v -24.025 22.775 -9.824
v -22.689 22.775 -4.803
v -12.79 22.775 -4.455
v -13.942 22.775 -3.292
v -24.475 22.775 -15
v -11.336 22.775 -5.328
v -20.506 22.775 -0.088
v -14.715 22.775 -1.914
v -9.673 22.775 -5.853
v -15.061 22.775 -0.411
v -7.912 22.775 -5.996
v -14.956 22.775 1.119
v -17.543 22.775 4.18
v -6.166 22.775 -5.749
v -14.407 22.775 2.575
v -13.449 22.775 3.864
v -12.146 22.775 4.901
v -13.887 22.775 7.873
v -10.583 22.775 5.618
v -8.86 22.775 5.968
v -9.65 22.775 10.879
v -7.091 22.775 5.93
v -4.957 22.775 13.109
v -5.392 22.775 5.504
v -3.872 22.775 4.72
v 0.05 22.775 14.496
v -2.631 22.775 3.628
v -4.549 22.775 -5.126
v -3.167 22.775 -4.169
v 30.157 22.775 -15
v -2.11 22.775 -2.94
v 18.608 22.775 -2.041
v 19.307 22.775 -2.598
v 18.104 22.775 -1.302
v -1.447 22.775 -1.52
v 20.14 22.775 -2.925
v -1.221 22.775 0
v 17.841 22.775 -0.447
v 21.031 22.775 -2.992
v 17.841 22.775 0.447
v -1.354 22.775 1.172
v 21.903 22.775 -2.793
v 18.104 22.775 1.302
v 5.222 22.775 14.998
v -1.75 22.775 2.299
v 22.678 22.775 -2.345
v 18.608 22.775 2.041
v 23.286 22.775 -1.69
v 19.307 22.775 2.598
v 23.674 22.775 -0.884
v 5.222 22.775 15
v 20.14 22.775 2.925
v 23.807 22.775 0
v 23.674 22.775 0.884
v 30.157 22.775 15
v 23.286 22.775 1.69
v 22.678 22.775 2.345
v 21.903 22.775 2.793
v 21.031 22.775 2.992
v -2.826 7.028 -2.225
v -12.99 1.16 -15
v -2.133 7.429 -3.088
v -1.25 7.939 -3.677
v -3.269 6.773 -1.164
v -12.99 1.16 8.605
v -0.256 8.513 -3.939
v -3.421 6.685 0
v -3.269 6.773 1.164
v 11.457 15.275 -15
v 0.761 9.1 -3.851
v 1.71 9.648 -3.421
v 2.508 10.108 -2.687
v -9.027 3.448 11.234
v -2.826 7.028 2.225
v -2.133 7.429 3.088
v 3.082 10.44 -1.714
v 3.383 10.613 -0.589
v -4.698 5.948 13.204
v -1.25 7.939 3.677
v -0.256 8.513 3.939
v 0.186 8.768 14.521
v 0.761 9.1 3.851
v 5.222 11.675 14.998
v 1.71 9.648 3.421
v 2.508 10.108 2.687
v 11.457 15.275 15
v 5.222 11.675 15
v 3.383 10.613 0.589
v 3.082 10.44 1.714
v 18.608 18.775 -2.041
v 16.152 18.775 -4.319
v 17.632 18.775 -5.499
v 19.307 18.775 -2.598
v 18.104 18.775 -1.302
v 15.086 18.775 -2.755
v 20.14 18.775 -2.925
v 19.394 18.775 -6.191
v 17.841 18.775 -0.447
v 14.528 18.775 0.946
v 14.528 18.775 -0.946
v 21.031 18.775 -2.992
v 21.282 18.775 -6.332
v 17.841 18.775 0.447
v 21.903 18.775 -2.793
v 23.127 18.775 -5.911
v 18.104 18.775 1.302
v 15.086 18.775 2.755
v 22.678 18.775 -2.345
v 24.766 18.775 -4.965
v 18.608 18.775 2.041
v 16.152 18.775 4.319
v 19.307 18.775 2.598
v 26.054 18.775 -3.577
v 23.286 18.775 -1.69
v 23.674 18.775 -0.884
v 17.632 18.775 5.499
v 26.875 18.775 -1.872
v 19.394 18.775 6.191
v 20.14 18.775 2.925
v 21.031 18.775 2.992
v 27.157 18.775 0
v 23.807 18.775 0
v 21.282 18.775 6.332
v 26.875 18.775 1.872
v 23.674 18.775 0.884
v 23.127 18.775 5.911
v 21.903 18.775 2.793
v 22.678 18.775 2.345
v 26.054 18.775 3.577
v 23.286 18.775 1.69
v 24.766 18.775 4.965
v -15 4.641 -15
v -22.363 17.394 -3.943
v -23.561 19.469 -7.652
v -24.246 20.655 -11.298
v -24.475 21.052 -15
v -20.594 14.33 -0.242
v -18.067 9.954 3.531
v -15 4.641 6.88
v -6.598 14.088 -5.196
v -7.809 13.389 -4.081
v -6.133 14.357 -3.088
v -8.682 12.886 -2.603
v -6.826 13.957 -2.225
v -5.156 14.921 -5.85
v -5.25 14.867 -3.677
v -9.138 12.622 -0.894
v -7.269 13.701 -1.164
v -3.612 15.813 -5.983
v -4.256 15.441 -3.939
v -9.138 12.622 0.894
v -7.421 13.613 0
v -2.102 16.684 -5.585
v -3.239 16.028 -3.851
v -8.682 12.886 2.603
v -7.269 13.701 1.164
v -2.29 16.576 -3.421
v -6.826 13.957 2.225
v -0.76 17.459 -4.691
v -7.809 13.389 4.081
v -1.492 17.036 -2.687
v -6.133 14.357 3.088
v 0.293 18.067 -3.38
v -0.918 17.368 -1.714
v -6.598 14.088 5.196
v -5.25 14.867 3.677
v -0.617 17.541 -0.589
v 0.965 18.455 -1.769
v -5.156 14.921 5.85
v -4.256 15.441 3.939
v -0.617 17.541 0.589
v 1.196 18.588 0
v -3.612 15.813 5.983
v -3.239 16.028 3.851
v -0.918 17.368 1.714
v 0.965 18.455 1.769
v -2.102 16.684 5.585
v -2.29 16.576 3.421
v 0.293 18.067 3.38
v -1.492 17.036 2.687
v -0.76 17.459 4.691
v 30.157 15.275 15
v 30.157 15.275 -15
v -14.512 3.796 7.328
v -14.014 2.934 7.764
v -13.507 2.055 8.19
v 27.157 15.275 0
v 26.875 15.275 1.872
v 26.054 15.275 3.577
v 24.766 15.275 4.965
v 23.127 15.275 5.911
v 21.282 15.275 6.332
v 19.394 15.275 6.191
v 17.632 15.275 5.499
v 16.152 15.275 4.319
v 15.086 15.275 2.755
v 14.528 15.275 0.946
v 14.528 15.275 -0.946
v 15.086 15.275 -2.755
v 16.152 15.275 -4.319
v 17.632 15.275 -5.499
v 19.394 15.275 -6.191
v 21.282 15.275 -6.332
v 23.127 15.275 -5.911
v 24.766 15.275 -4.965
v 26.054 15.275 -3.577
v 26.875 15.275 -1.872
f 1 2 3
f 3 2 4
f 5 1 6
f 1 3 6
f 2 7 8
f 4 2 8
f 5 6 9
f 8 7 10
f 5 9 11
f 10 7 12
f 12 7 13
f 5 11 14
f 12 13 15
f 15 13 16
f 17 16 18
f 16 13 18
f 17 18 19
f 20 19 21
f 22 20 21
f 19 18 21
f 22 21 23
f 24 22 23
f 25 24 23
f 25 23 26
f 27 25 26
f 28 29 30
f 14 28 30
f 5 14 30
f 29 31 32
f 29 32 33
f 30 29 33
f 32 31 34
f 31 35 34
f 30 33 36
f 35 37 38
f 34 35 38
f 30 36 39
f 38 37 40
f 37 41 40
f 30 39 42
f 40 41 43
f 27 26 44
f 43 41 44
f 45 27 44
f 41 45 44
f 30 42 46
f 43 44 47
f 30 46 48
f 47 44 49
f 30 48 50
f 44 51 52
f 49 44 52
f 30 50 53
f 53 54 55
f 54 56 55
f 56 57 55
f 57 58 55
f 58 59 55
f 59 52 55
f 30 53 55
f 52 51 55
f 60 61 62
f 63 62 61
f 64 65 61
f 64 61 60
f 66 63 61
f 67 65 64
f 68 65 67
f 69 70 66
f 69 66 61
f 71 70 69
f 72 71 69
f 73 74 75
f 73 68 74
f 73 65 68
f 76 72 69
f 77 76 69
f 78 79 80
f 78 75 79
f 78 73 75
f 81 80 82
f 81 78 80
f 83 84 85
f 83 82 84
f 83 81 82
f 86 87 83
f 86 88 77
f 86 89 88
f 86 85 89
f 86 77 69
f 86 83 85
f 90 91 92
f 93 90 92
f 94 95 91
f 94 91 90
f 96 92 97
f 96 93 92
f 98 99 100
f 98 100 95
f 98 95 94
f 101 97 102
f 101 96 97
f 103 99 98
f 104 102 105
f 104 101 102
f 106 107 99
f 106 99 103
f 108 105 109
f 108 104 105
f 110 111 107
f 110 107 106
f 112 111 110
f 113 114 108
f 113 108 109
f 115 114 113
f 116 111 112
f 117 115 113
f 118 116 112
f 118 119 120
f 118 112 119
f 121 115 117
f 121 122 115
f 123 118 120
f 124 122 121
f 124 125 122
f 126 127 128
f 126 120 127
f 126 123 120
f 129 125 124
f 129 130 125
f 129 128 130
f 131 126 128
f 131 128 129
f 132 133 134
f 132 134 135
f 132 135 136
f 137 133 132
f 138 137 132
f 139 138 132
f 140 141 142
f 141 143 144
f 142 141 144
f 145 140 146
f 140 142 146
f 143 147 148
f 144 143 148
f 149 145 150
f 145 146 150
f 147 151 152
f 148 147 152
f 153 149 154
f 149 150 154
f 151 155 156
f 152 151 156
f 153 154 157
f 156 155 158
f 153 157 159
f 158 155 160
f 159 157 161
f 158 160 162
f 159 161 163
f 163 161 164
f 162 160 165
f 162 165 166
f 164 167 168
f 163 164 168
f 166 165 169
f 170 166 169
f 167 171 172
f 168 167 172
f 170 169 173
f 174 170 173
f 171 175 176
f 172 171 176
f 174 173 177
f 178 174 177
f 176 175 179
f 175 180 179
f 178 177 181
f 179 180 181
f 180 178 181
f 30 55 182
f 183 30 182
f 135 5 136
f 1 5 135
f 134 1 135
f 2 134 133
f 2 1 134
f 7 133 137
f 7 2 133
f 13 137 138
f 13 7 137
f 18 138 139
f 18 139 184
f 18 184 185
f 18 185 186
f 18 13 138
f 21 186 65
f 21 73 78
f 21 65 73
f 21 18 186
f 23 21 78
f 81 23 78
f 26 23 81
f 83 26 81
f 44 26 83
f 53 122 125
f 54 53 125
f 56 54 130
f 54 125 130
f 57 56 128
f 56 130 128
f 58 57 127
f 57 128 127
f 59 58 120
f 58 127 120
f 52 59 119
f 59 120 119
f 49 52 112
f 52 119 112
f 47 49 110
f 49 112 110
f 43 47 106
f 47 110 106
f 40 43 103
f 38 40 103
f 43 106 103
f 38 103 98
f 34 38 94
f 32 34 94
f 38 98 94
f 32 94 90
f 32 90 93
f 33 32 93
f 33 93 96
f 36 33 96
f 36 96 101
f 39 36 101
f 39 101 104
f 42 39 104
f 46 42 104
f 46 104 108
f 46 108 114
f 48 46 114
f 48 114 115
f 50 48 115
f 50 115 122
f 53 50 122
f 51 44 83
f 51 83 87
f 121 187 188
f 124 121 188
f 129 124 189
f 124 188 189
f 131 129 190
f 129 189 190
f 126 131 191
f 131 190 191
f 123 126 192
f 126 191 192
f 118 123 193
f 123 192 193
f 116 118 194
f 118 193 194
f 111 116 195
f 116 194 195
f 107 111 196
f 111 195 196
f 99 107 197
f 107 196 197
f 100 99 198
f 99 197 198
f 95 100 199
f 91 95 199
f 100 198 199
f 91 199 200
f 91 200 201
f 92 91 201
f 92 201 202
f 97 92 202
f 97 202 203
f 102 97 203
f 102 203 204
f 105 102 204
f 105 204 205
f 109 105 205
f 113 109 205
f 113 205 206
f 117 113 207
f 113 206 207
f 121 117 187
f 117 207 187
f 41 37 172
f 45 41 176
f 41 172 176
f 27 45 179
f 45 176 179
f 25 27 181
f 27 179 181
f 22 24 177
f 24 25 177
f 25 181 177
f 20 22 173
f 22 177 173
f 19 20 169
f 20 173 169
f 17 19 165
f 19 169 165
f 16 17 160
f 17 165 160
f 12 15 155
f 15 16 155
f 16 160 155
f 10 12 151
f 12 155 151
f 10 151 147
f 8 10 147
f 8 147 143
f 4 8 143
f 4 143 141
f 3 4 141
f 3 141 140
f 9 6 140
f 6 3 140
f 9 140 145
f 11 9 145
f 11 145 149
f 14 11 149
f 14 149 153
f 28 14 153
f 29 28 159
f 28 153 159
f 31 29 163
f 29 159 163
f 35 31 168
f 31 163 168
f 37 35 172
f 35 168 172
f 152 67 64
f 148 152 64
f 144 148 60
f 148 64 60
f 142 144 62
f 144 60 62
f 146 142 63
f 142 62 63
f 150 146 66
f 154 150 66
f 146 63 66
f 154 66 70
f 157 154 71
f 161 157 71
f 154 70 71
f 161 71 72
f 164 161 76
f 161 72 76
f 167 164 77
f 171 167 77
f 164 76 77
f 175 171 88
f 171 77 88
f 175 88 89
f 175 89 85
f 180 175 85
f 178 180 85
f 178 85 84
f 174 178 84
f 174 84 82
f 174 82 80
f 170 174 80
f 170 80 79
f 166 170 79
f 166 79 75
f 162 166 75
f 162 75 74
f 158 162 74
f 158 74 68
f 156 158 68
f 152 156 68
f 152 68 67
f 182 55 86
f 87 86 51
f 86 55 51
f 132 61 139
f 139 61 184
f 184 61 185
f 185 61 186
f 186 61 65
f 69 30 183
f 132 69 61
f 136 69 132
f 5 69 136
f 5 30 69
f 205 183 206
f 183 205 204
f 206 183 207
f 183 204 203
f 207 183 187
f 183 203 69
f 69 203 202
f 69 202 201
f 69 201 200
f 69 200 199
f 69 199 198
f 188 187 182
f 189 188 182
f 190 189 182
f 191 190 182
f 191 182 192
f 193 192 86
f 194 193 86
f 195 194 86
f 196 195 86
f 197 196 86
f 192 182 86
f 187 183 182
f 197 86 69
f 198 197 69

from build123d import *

# Parameters (mm, degrees)
ESBO_O1_W                = 30
ESBO_O1_H                = 30
RESSALTO_EXTRUS_O1_DEPTH = 22.775
CORTE_EXTRUS_O1_DEPTH    = 31
ESBO_O3_OUTSIDE_W        = 48.998
ESBO_O3_OUTSIDE_H        = 41.63
ESBO_O3_OUTSIDE_W_2      = 30
ESBO_O3_OUTSIDE_H_2      = 30
CORTE_EXTRUS_O2_DEPTH    = 20.723728571
RESSALTO_EXTRUS_O2_DEPTH = 30
ESBO_O5_R                = 3.95
CORTE_EXTRUS_O3_DEPTH    = 25.958558799
CORTE_EXTRUS_O5_START    = -8
ESBO_O8_R                = 6
CORTE_EXTRUS_O5_DEPTH    = 25
RESSALTO_EXTRUS_O6_DEPTH = 30
CORTE_EXTRUS_O11_DEPTH   = 26
ESBO_O19_R               = 6.35
CORTE_EXTRUS_O12_DEPTH   = 3.5
ESBO_O20_R               = 3
CORTE_EXTRUS_O13_DEPTH   = 26


with BuildPart() as part:
    # Esboço1 → Ressalto-extrusão1 (new body)
    with BuildSketch(Plane(origin=(0, 0, 0), x_dir=(1, 0, 0), z_dir=(0, 1, 0))):
        Rectangle(ESBO_O1_W, ESBO_O1_H)
    extrude(amount=RESSALTO_EXTRUS_O1_DEPTH)

    # Esboço2 → Corte-extrusão1 (cut, through all)
    with BuildSketch(Plane.XY.offset(15)):
        Polygon((-15, 0), (15, 17.320508076), (15, 0), align=None)
    extrude(amount=-CORTE_EXTRUS_O1_DEPTH, mode=Mode.SUBTRACT)

    # Esboço3 outside → Corte-extrusão2 (cut, through all)
    with BuildSketch(Plane(origin=(-3.75, 6.495190528, 0), x_dir=(0.866025404, 0.5, 0), z_dir=(0.5, -0.866025404, 0))):
        with Locations((5.694, 0)):
            Rectangle(ESBO_O3_OUTSIDE_W, ESBO_O3_OUTSIDE_H)
        with Locations((4.330127019, 0)):
            Rectangle(ESBO_O3_OUTSIDE_W_2, ESBO_O3_OUTSIDE_H_2, mode=Mode.SUBTRACT)
    extrude(amount=-CORTE_EXTRUS_O2_DEPTH, mode=Mode.SUBTRACT)

    # Esboço4 → Ressalto-extrusão2 (add)
    with BuildSketch(Plane.XY.offset(15)):
        Polygon((-25.469660456, 22.775), (-15, 4.641016151), (-15, 22.775), align=None)
    extrude(amount=-RESSALTO_EXTRUS_O2_DEPTH)

    # Esboço5 → Corte-extrusão3 (cut, through all)
    with BuildSketch(Plane(origin=(-3.75, 6.495190528, 0), x_dir=(-0.866025404, -0.5, 0), z_dir=(0.5, -0.866025404, 0))):
        with Locations((-4.330131096, -4.077e-06)):
            Circle(ESBO_O5_R)
    extrude(amount=-CORTE_EXTRUS_O3_DEPTH, mode=Mode.SUBTRACT)

    # Esboço8 → Corte-extrusão5 (cut)
    with BuildSketch(Plane(origin=(-3.75, 6.495190528, 0), x_dir=(0.866025404, 0.5, 0), z_dir=(0.5, -0.866025404, 0)).offset(CORTE_EXTRUS_O5_START)):
        with Locations((4.330131096, 4.077e-06)):
            Circle(ESBO_O8_R)
    extrude(amount=-CORTE_EXTRUS_O5_DEPTH, mode=Mode.SUBTRACT)

    # Esboço16 → Ressalto-extrusão6 (add)
    with BuildSketch(Plane.XY.offset(15)):
        Polygon((9.171355695, 22.775), (30.157076086, 22.775), (30.157076086, 15.275), (11.457076086, 15.275), align=None)
    extrude(amount=-RESSALTO_EXTRUS_O6_DEPTH)

    # Esboço17 → Corte-extrusão11 (cut)
    with BuildSketch(Plane(origin=(0, 22.775, 0), x_dir=(1, 0, 0), z_dir=(0, 1, 0))):
        with BuildLine():
            Line((5.221968449, -14.998459918), (5.221968449, -42.526473986))
            Line((5.221968449, -42.526473986), (-49.914065742, -42.526473986))
            Line((-49.914065742, -42.526473986), (-49.914065742, 15))
            Line((-49.914065742, 15), (-24.474999573, 15))
            ThreePointArc((-24.474999573, 15), (-15.795068431, -6.105787356), (5.221968449, -14.998459918))
        make_face()
    extrude(amount=-CORTE_EXTRUS_O11_DEPTH, mode=Mode.SUBTRACT)

    # Esboço19 → Corte-extrusão12 (cut)
    with BuildSketch(Plane.XZ.offset(-15.275)):
        with Locations((20.807076086, 0)):
            Circle(ESBO_O19_R)
    extrude(amount=-CORTE_EXTRUS_O12_DEPTH, mode=Mode.SUBTRACT)

    # Esboço20 → Corte-extrusão13 (cut)
    with BuildSketch(Plane.XZ.offset(-18.775)):
        with Locations((20.807076086, 0)):
            Circle(ESBO_O20_R)
    extrude(amount=-CORTE_EXTRUS_O13_DEPTH, mode=Mode.SUBTRACT)


solid = part.part
